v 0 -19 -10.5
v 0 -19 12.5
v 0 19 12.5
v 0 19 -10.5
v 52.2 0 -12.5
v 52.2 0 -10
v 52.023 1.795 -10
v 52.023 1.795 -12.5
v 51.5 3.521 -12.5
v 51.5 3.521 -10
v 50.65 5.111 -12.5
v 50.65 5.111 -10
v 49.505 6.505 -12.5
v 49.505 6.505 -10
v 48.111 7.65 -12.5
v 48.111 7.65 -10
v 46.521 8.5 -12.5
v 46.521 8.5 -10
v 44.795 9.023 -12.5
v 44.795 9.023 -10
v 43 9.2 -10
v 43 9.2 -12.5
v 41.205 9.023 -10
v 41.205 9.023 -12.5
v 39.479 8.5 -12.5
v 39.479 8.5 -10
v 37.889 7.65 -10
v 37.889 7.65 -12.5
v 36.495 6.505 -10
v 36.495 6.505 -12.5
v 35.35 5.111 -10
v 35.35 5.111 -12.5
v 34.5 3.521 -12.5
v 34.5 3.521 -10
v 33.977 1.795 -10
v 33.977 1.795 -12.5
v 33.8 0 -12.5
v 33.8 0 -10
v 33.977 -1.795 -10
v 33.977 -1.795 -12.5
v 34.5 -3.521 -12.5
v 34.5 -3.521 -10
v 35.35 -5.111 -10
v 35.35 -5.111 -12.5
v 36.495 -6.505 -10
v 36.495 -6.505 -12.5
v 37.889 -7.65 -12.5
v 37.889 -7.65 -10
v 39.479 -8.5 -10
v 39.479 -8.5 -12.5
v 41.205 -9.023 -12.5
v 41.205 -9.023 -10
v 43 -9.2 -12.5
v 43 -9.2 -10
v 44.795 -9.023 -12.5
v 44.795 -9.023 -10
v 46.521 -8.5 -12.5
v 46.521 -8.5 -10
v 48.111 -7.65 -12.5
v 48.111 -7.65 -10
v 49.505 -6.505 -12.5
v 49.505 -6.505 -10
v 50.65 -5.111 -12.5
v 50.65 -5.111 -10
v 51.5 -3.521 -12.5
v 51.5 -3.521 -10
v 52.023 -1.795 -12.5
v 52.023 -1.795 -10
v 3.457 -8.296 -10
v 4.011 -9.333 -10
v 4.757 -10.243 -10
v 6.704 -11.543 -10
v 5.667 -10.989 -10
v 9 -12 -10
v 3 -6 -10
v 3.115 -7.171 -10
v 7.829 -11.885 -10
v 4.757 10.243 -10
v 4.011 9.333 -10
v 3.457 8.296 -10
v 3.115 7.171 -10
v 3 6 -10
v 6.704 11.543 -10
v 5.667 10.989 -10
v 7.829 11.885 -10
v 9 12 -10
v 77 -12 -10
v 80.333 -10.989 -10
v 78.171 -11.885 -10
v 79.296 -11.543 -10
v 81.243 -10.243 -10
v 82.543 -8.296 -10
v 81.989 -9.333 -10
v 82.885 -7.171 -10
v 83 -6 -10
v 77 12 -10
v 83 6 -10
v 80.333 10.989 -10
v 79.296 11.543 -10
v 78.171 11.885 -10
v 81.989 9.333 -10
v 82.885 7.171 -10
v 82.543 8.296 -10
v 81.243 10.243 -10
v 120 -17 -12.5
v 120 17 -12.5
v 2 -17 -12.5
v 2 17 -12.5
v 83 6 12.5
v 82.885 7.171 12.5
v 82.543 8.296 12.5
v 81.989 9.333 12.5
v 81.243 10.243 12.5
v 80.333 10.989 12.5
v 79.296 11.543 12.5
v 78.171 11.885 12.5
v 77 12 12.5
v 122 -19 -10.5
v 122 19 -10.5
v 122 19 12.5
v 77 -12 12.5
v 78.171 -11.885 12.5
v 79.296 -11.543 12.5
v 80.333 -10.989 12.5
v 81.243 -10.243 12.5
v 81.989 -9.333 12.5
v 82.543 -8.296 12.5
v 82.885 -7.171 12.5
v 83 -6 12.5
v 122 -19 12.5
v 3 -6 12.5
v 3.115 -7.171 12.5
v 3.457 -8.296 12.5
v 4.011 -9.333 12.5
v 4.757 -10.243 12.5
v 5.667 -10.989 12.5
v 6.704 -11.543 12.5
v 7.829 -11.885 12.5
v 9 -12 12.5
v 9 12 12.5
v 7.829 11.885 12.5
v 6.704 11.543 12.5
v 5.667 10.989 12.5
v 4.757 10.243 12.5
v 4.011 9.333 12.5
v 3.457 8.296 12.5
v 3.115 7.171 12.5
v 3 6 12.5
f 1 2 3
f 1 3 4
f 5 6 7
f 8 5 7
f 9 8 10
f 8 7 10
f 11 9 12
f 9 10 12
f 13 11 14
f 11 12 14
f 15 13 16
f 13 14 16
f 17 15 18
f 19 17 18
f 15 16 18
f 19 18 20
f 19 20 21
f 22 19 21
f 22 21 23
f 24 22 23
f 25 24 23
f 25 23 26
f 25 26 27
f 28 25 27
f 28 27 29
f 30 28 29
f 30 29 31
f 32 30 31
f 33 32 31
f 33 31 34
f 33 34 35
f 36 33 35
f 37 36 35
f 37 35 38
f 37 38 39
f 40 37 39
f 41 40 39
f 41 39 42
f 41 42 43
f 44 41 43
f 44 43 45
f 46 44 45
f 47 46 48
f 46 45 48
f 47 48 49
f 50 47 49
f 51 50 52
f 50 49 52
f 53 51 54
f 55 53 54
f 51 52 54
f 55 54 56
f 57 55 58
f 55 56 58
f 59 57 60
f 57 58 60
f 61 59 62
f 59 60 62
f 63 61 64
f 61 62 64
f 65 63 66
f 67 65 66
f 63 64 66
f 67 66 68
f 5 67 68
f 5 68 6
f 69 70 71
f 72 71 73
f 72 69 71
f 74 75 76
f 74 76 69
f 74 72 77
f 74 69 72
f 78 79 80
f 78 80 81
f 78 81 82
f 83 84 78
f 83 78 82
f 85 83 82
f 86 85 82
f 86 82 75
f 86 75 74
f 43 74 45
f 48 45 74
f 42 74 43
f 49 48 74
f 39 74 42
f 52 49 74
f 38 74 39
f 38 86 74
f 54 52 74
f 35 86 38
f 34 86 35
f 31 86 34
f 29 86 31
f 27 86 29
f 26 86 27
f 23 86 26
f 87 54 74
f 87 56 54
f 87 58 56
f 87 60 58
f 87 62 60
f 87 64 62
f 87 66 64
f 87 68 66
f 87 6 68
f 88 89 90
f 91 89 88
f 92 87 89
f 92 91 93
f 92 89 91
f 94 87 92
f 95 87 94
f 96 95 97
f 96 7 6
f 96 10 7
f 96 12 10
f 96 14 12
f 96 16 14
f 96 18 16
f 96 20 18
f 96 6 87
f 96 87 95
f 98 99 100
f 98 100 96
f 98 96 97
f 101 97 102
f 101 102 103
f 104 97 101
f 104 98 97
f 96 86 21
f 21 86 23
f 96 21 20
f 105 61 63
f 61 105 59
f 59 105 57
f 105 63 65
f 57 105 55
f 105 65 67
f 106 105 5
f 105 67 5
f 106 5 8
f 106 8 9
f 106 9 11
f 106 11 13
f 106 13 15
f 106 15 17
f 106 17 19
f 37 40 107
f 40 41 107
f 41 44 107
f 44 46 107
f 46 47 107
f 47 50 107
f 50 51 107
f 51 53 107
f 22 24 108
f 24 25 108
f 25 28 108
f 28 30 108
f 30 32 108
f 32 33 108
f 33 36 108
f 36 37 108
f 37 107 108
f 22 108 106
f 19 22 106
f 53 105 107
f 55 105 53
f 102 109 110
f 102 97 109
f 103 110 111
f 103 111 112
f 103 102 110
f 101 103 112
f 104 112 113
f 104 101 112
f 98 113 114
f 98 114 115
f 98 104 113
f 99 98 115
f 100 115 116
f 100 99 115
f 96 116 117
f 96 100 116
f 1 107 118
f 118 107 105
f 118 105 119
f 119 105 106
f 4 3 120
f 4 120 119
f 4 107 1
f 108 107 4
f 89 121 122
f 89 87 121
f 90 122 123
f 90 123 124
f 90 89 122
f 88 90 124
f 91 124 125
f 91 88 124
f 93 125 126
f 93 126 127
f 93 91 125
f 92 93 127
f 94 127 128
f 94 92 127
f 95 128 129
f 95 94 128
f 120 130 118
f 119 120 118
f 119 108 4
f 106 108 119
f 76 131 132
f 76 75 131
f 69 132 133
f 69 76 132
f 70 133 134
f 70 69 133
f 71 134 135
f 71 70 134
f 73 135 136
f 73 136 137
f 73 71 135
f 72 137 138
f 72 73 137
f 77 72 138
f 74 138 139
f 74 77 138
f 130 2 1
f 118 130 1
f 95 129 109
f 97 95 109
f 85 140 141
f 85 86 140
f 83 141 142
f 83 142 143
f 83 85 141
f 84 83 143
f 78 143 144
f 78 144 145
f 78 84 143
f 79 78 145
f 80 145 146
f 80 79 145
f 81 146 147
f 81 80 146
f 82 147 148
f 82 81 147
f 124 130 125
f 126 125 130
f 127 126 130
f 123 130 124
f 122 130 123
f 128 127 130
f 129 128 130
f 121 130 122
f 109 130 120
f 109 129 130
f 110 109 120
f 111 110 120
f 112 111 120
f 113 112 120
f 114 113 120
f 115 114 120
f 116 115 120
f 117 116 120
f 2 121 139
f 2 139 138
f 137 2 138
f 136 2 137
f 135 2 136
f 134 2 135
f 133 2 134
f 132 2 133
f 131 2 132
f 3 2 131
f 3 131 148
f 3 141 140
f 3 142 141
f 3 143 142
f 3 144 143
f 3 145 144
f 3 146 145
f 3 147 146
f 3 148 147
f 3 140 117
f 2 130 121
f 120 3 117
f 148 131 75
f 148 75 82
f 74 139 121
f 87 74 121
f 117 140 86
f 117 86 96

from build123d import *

# Parameters (mm, degrees)
SKETCH1_W           = 25
SKETCH1_H           = 38
BOSS_EXTRUDE1_DEPTH = 122
SKETCH2_W           = 80
SKETCH2_H           = 24
CUT_EXTRUDE1_DEPTH  = 22.5
FILLET1_R           = 6
FILLET2_R           = 6
FILLET3_R           = 6
FILLET4_R           = 6
SKETCH3_R           = 9.2
CUT_EXTRUDE2_DEPTH  = 126.503984001
CHAMFER2_SIZE       = 2


with BuildPart() as part:
    # Sketch1 → Boss-Extrude1 (new body)
    with BuildSketch(Plane(origin=(0, 0, 0), x_dir=(0, 0, -1), z_dir=(1, 0, 0))):
        Rectangle(SKETCH1_W, SKETCH1_H)
    extrude(amount=BOSS_EXTRUDE1_DEPTH)

    # Sketch2 → Cut-Extrude1 (cut)
    with BuildSketch(Plane.XY.offset(12.5)):
        with Locations((43, 0)):
            Rectangle(SKETCH2_W, SKETCH2_H)
    extrude(amount=-CUT_EXTRUDE1_DEPTH, mode=Mode.SUBTRACT)

    # Fillet1
    fillet1_edges = [part.edges().sort_by_distance(p)[0] for p in [
        (3, 12, 1.25),
    ]]
    fillet(fillet1_edges, radius=FILLET1_R)

    # Fillet2
    fillet2_edges = [part.edges().sort_by_distance(p)[0] for p in [
        (3, -12, 1.25),
    ]]
    fillet(fillet2_edges, radius=FILLET2_R)

    # Fillet3
    fillet3_edges = [part.edges().sort_by_distance(p)[0] for p in [
        (83, -12, 1.25),
    ]]
    fillet(fillet3_edges, radius=FILLET3_R)

    # Fillet4
    fillet4_edges = [part.edges().sort_by_distance(p)[0] for p in [
        (83, 12, 1.25),
    ]]
    fillet(fillet4_edges, radius=FILLET4_R)

    # Sketch3 → Cut-Extrude2 (cut, through all)
    with BuildSketch(Plane.XY.offset(-10)):
        with Locations((43, 0)):
            Circle(SKETCH3_R)
    extrude(amount=-CUT_EXTRUDE2_DEPTH, mode=Mode.SUBTRACT)

    # Chamfer2
    chamfer2_edges = [part.edges().sort_by_distance(p)[0] for p in [
        (122, 0, -12.5),
        (0, 0, -12.5),
        (61, -19, -12.5),
        (61, 19, -12.5),
    ]]
    chamfer(chamfer2_edges, length=CHAMFER2_SIZE)


solid = part.part
